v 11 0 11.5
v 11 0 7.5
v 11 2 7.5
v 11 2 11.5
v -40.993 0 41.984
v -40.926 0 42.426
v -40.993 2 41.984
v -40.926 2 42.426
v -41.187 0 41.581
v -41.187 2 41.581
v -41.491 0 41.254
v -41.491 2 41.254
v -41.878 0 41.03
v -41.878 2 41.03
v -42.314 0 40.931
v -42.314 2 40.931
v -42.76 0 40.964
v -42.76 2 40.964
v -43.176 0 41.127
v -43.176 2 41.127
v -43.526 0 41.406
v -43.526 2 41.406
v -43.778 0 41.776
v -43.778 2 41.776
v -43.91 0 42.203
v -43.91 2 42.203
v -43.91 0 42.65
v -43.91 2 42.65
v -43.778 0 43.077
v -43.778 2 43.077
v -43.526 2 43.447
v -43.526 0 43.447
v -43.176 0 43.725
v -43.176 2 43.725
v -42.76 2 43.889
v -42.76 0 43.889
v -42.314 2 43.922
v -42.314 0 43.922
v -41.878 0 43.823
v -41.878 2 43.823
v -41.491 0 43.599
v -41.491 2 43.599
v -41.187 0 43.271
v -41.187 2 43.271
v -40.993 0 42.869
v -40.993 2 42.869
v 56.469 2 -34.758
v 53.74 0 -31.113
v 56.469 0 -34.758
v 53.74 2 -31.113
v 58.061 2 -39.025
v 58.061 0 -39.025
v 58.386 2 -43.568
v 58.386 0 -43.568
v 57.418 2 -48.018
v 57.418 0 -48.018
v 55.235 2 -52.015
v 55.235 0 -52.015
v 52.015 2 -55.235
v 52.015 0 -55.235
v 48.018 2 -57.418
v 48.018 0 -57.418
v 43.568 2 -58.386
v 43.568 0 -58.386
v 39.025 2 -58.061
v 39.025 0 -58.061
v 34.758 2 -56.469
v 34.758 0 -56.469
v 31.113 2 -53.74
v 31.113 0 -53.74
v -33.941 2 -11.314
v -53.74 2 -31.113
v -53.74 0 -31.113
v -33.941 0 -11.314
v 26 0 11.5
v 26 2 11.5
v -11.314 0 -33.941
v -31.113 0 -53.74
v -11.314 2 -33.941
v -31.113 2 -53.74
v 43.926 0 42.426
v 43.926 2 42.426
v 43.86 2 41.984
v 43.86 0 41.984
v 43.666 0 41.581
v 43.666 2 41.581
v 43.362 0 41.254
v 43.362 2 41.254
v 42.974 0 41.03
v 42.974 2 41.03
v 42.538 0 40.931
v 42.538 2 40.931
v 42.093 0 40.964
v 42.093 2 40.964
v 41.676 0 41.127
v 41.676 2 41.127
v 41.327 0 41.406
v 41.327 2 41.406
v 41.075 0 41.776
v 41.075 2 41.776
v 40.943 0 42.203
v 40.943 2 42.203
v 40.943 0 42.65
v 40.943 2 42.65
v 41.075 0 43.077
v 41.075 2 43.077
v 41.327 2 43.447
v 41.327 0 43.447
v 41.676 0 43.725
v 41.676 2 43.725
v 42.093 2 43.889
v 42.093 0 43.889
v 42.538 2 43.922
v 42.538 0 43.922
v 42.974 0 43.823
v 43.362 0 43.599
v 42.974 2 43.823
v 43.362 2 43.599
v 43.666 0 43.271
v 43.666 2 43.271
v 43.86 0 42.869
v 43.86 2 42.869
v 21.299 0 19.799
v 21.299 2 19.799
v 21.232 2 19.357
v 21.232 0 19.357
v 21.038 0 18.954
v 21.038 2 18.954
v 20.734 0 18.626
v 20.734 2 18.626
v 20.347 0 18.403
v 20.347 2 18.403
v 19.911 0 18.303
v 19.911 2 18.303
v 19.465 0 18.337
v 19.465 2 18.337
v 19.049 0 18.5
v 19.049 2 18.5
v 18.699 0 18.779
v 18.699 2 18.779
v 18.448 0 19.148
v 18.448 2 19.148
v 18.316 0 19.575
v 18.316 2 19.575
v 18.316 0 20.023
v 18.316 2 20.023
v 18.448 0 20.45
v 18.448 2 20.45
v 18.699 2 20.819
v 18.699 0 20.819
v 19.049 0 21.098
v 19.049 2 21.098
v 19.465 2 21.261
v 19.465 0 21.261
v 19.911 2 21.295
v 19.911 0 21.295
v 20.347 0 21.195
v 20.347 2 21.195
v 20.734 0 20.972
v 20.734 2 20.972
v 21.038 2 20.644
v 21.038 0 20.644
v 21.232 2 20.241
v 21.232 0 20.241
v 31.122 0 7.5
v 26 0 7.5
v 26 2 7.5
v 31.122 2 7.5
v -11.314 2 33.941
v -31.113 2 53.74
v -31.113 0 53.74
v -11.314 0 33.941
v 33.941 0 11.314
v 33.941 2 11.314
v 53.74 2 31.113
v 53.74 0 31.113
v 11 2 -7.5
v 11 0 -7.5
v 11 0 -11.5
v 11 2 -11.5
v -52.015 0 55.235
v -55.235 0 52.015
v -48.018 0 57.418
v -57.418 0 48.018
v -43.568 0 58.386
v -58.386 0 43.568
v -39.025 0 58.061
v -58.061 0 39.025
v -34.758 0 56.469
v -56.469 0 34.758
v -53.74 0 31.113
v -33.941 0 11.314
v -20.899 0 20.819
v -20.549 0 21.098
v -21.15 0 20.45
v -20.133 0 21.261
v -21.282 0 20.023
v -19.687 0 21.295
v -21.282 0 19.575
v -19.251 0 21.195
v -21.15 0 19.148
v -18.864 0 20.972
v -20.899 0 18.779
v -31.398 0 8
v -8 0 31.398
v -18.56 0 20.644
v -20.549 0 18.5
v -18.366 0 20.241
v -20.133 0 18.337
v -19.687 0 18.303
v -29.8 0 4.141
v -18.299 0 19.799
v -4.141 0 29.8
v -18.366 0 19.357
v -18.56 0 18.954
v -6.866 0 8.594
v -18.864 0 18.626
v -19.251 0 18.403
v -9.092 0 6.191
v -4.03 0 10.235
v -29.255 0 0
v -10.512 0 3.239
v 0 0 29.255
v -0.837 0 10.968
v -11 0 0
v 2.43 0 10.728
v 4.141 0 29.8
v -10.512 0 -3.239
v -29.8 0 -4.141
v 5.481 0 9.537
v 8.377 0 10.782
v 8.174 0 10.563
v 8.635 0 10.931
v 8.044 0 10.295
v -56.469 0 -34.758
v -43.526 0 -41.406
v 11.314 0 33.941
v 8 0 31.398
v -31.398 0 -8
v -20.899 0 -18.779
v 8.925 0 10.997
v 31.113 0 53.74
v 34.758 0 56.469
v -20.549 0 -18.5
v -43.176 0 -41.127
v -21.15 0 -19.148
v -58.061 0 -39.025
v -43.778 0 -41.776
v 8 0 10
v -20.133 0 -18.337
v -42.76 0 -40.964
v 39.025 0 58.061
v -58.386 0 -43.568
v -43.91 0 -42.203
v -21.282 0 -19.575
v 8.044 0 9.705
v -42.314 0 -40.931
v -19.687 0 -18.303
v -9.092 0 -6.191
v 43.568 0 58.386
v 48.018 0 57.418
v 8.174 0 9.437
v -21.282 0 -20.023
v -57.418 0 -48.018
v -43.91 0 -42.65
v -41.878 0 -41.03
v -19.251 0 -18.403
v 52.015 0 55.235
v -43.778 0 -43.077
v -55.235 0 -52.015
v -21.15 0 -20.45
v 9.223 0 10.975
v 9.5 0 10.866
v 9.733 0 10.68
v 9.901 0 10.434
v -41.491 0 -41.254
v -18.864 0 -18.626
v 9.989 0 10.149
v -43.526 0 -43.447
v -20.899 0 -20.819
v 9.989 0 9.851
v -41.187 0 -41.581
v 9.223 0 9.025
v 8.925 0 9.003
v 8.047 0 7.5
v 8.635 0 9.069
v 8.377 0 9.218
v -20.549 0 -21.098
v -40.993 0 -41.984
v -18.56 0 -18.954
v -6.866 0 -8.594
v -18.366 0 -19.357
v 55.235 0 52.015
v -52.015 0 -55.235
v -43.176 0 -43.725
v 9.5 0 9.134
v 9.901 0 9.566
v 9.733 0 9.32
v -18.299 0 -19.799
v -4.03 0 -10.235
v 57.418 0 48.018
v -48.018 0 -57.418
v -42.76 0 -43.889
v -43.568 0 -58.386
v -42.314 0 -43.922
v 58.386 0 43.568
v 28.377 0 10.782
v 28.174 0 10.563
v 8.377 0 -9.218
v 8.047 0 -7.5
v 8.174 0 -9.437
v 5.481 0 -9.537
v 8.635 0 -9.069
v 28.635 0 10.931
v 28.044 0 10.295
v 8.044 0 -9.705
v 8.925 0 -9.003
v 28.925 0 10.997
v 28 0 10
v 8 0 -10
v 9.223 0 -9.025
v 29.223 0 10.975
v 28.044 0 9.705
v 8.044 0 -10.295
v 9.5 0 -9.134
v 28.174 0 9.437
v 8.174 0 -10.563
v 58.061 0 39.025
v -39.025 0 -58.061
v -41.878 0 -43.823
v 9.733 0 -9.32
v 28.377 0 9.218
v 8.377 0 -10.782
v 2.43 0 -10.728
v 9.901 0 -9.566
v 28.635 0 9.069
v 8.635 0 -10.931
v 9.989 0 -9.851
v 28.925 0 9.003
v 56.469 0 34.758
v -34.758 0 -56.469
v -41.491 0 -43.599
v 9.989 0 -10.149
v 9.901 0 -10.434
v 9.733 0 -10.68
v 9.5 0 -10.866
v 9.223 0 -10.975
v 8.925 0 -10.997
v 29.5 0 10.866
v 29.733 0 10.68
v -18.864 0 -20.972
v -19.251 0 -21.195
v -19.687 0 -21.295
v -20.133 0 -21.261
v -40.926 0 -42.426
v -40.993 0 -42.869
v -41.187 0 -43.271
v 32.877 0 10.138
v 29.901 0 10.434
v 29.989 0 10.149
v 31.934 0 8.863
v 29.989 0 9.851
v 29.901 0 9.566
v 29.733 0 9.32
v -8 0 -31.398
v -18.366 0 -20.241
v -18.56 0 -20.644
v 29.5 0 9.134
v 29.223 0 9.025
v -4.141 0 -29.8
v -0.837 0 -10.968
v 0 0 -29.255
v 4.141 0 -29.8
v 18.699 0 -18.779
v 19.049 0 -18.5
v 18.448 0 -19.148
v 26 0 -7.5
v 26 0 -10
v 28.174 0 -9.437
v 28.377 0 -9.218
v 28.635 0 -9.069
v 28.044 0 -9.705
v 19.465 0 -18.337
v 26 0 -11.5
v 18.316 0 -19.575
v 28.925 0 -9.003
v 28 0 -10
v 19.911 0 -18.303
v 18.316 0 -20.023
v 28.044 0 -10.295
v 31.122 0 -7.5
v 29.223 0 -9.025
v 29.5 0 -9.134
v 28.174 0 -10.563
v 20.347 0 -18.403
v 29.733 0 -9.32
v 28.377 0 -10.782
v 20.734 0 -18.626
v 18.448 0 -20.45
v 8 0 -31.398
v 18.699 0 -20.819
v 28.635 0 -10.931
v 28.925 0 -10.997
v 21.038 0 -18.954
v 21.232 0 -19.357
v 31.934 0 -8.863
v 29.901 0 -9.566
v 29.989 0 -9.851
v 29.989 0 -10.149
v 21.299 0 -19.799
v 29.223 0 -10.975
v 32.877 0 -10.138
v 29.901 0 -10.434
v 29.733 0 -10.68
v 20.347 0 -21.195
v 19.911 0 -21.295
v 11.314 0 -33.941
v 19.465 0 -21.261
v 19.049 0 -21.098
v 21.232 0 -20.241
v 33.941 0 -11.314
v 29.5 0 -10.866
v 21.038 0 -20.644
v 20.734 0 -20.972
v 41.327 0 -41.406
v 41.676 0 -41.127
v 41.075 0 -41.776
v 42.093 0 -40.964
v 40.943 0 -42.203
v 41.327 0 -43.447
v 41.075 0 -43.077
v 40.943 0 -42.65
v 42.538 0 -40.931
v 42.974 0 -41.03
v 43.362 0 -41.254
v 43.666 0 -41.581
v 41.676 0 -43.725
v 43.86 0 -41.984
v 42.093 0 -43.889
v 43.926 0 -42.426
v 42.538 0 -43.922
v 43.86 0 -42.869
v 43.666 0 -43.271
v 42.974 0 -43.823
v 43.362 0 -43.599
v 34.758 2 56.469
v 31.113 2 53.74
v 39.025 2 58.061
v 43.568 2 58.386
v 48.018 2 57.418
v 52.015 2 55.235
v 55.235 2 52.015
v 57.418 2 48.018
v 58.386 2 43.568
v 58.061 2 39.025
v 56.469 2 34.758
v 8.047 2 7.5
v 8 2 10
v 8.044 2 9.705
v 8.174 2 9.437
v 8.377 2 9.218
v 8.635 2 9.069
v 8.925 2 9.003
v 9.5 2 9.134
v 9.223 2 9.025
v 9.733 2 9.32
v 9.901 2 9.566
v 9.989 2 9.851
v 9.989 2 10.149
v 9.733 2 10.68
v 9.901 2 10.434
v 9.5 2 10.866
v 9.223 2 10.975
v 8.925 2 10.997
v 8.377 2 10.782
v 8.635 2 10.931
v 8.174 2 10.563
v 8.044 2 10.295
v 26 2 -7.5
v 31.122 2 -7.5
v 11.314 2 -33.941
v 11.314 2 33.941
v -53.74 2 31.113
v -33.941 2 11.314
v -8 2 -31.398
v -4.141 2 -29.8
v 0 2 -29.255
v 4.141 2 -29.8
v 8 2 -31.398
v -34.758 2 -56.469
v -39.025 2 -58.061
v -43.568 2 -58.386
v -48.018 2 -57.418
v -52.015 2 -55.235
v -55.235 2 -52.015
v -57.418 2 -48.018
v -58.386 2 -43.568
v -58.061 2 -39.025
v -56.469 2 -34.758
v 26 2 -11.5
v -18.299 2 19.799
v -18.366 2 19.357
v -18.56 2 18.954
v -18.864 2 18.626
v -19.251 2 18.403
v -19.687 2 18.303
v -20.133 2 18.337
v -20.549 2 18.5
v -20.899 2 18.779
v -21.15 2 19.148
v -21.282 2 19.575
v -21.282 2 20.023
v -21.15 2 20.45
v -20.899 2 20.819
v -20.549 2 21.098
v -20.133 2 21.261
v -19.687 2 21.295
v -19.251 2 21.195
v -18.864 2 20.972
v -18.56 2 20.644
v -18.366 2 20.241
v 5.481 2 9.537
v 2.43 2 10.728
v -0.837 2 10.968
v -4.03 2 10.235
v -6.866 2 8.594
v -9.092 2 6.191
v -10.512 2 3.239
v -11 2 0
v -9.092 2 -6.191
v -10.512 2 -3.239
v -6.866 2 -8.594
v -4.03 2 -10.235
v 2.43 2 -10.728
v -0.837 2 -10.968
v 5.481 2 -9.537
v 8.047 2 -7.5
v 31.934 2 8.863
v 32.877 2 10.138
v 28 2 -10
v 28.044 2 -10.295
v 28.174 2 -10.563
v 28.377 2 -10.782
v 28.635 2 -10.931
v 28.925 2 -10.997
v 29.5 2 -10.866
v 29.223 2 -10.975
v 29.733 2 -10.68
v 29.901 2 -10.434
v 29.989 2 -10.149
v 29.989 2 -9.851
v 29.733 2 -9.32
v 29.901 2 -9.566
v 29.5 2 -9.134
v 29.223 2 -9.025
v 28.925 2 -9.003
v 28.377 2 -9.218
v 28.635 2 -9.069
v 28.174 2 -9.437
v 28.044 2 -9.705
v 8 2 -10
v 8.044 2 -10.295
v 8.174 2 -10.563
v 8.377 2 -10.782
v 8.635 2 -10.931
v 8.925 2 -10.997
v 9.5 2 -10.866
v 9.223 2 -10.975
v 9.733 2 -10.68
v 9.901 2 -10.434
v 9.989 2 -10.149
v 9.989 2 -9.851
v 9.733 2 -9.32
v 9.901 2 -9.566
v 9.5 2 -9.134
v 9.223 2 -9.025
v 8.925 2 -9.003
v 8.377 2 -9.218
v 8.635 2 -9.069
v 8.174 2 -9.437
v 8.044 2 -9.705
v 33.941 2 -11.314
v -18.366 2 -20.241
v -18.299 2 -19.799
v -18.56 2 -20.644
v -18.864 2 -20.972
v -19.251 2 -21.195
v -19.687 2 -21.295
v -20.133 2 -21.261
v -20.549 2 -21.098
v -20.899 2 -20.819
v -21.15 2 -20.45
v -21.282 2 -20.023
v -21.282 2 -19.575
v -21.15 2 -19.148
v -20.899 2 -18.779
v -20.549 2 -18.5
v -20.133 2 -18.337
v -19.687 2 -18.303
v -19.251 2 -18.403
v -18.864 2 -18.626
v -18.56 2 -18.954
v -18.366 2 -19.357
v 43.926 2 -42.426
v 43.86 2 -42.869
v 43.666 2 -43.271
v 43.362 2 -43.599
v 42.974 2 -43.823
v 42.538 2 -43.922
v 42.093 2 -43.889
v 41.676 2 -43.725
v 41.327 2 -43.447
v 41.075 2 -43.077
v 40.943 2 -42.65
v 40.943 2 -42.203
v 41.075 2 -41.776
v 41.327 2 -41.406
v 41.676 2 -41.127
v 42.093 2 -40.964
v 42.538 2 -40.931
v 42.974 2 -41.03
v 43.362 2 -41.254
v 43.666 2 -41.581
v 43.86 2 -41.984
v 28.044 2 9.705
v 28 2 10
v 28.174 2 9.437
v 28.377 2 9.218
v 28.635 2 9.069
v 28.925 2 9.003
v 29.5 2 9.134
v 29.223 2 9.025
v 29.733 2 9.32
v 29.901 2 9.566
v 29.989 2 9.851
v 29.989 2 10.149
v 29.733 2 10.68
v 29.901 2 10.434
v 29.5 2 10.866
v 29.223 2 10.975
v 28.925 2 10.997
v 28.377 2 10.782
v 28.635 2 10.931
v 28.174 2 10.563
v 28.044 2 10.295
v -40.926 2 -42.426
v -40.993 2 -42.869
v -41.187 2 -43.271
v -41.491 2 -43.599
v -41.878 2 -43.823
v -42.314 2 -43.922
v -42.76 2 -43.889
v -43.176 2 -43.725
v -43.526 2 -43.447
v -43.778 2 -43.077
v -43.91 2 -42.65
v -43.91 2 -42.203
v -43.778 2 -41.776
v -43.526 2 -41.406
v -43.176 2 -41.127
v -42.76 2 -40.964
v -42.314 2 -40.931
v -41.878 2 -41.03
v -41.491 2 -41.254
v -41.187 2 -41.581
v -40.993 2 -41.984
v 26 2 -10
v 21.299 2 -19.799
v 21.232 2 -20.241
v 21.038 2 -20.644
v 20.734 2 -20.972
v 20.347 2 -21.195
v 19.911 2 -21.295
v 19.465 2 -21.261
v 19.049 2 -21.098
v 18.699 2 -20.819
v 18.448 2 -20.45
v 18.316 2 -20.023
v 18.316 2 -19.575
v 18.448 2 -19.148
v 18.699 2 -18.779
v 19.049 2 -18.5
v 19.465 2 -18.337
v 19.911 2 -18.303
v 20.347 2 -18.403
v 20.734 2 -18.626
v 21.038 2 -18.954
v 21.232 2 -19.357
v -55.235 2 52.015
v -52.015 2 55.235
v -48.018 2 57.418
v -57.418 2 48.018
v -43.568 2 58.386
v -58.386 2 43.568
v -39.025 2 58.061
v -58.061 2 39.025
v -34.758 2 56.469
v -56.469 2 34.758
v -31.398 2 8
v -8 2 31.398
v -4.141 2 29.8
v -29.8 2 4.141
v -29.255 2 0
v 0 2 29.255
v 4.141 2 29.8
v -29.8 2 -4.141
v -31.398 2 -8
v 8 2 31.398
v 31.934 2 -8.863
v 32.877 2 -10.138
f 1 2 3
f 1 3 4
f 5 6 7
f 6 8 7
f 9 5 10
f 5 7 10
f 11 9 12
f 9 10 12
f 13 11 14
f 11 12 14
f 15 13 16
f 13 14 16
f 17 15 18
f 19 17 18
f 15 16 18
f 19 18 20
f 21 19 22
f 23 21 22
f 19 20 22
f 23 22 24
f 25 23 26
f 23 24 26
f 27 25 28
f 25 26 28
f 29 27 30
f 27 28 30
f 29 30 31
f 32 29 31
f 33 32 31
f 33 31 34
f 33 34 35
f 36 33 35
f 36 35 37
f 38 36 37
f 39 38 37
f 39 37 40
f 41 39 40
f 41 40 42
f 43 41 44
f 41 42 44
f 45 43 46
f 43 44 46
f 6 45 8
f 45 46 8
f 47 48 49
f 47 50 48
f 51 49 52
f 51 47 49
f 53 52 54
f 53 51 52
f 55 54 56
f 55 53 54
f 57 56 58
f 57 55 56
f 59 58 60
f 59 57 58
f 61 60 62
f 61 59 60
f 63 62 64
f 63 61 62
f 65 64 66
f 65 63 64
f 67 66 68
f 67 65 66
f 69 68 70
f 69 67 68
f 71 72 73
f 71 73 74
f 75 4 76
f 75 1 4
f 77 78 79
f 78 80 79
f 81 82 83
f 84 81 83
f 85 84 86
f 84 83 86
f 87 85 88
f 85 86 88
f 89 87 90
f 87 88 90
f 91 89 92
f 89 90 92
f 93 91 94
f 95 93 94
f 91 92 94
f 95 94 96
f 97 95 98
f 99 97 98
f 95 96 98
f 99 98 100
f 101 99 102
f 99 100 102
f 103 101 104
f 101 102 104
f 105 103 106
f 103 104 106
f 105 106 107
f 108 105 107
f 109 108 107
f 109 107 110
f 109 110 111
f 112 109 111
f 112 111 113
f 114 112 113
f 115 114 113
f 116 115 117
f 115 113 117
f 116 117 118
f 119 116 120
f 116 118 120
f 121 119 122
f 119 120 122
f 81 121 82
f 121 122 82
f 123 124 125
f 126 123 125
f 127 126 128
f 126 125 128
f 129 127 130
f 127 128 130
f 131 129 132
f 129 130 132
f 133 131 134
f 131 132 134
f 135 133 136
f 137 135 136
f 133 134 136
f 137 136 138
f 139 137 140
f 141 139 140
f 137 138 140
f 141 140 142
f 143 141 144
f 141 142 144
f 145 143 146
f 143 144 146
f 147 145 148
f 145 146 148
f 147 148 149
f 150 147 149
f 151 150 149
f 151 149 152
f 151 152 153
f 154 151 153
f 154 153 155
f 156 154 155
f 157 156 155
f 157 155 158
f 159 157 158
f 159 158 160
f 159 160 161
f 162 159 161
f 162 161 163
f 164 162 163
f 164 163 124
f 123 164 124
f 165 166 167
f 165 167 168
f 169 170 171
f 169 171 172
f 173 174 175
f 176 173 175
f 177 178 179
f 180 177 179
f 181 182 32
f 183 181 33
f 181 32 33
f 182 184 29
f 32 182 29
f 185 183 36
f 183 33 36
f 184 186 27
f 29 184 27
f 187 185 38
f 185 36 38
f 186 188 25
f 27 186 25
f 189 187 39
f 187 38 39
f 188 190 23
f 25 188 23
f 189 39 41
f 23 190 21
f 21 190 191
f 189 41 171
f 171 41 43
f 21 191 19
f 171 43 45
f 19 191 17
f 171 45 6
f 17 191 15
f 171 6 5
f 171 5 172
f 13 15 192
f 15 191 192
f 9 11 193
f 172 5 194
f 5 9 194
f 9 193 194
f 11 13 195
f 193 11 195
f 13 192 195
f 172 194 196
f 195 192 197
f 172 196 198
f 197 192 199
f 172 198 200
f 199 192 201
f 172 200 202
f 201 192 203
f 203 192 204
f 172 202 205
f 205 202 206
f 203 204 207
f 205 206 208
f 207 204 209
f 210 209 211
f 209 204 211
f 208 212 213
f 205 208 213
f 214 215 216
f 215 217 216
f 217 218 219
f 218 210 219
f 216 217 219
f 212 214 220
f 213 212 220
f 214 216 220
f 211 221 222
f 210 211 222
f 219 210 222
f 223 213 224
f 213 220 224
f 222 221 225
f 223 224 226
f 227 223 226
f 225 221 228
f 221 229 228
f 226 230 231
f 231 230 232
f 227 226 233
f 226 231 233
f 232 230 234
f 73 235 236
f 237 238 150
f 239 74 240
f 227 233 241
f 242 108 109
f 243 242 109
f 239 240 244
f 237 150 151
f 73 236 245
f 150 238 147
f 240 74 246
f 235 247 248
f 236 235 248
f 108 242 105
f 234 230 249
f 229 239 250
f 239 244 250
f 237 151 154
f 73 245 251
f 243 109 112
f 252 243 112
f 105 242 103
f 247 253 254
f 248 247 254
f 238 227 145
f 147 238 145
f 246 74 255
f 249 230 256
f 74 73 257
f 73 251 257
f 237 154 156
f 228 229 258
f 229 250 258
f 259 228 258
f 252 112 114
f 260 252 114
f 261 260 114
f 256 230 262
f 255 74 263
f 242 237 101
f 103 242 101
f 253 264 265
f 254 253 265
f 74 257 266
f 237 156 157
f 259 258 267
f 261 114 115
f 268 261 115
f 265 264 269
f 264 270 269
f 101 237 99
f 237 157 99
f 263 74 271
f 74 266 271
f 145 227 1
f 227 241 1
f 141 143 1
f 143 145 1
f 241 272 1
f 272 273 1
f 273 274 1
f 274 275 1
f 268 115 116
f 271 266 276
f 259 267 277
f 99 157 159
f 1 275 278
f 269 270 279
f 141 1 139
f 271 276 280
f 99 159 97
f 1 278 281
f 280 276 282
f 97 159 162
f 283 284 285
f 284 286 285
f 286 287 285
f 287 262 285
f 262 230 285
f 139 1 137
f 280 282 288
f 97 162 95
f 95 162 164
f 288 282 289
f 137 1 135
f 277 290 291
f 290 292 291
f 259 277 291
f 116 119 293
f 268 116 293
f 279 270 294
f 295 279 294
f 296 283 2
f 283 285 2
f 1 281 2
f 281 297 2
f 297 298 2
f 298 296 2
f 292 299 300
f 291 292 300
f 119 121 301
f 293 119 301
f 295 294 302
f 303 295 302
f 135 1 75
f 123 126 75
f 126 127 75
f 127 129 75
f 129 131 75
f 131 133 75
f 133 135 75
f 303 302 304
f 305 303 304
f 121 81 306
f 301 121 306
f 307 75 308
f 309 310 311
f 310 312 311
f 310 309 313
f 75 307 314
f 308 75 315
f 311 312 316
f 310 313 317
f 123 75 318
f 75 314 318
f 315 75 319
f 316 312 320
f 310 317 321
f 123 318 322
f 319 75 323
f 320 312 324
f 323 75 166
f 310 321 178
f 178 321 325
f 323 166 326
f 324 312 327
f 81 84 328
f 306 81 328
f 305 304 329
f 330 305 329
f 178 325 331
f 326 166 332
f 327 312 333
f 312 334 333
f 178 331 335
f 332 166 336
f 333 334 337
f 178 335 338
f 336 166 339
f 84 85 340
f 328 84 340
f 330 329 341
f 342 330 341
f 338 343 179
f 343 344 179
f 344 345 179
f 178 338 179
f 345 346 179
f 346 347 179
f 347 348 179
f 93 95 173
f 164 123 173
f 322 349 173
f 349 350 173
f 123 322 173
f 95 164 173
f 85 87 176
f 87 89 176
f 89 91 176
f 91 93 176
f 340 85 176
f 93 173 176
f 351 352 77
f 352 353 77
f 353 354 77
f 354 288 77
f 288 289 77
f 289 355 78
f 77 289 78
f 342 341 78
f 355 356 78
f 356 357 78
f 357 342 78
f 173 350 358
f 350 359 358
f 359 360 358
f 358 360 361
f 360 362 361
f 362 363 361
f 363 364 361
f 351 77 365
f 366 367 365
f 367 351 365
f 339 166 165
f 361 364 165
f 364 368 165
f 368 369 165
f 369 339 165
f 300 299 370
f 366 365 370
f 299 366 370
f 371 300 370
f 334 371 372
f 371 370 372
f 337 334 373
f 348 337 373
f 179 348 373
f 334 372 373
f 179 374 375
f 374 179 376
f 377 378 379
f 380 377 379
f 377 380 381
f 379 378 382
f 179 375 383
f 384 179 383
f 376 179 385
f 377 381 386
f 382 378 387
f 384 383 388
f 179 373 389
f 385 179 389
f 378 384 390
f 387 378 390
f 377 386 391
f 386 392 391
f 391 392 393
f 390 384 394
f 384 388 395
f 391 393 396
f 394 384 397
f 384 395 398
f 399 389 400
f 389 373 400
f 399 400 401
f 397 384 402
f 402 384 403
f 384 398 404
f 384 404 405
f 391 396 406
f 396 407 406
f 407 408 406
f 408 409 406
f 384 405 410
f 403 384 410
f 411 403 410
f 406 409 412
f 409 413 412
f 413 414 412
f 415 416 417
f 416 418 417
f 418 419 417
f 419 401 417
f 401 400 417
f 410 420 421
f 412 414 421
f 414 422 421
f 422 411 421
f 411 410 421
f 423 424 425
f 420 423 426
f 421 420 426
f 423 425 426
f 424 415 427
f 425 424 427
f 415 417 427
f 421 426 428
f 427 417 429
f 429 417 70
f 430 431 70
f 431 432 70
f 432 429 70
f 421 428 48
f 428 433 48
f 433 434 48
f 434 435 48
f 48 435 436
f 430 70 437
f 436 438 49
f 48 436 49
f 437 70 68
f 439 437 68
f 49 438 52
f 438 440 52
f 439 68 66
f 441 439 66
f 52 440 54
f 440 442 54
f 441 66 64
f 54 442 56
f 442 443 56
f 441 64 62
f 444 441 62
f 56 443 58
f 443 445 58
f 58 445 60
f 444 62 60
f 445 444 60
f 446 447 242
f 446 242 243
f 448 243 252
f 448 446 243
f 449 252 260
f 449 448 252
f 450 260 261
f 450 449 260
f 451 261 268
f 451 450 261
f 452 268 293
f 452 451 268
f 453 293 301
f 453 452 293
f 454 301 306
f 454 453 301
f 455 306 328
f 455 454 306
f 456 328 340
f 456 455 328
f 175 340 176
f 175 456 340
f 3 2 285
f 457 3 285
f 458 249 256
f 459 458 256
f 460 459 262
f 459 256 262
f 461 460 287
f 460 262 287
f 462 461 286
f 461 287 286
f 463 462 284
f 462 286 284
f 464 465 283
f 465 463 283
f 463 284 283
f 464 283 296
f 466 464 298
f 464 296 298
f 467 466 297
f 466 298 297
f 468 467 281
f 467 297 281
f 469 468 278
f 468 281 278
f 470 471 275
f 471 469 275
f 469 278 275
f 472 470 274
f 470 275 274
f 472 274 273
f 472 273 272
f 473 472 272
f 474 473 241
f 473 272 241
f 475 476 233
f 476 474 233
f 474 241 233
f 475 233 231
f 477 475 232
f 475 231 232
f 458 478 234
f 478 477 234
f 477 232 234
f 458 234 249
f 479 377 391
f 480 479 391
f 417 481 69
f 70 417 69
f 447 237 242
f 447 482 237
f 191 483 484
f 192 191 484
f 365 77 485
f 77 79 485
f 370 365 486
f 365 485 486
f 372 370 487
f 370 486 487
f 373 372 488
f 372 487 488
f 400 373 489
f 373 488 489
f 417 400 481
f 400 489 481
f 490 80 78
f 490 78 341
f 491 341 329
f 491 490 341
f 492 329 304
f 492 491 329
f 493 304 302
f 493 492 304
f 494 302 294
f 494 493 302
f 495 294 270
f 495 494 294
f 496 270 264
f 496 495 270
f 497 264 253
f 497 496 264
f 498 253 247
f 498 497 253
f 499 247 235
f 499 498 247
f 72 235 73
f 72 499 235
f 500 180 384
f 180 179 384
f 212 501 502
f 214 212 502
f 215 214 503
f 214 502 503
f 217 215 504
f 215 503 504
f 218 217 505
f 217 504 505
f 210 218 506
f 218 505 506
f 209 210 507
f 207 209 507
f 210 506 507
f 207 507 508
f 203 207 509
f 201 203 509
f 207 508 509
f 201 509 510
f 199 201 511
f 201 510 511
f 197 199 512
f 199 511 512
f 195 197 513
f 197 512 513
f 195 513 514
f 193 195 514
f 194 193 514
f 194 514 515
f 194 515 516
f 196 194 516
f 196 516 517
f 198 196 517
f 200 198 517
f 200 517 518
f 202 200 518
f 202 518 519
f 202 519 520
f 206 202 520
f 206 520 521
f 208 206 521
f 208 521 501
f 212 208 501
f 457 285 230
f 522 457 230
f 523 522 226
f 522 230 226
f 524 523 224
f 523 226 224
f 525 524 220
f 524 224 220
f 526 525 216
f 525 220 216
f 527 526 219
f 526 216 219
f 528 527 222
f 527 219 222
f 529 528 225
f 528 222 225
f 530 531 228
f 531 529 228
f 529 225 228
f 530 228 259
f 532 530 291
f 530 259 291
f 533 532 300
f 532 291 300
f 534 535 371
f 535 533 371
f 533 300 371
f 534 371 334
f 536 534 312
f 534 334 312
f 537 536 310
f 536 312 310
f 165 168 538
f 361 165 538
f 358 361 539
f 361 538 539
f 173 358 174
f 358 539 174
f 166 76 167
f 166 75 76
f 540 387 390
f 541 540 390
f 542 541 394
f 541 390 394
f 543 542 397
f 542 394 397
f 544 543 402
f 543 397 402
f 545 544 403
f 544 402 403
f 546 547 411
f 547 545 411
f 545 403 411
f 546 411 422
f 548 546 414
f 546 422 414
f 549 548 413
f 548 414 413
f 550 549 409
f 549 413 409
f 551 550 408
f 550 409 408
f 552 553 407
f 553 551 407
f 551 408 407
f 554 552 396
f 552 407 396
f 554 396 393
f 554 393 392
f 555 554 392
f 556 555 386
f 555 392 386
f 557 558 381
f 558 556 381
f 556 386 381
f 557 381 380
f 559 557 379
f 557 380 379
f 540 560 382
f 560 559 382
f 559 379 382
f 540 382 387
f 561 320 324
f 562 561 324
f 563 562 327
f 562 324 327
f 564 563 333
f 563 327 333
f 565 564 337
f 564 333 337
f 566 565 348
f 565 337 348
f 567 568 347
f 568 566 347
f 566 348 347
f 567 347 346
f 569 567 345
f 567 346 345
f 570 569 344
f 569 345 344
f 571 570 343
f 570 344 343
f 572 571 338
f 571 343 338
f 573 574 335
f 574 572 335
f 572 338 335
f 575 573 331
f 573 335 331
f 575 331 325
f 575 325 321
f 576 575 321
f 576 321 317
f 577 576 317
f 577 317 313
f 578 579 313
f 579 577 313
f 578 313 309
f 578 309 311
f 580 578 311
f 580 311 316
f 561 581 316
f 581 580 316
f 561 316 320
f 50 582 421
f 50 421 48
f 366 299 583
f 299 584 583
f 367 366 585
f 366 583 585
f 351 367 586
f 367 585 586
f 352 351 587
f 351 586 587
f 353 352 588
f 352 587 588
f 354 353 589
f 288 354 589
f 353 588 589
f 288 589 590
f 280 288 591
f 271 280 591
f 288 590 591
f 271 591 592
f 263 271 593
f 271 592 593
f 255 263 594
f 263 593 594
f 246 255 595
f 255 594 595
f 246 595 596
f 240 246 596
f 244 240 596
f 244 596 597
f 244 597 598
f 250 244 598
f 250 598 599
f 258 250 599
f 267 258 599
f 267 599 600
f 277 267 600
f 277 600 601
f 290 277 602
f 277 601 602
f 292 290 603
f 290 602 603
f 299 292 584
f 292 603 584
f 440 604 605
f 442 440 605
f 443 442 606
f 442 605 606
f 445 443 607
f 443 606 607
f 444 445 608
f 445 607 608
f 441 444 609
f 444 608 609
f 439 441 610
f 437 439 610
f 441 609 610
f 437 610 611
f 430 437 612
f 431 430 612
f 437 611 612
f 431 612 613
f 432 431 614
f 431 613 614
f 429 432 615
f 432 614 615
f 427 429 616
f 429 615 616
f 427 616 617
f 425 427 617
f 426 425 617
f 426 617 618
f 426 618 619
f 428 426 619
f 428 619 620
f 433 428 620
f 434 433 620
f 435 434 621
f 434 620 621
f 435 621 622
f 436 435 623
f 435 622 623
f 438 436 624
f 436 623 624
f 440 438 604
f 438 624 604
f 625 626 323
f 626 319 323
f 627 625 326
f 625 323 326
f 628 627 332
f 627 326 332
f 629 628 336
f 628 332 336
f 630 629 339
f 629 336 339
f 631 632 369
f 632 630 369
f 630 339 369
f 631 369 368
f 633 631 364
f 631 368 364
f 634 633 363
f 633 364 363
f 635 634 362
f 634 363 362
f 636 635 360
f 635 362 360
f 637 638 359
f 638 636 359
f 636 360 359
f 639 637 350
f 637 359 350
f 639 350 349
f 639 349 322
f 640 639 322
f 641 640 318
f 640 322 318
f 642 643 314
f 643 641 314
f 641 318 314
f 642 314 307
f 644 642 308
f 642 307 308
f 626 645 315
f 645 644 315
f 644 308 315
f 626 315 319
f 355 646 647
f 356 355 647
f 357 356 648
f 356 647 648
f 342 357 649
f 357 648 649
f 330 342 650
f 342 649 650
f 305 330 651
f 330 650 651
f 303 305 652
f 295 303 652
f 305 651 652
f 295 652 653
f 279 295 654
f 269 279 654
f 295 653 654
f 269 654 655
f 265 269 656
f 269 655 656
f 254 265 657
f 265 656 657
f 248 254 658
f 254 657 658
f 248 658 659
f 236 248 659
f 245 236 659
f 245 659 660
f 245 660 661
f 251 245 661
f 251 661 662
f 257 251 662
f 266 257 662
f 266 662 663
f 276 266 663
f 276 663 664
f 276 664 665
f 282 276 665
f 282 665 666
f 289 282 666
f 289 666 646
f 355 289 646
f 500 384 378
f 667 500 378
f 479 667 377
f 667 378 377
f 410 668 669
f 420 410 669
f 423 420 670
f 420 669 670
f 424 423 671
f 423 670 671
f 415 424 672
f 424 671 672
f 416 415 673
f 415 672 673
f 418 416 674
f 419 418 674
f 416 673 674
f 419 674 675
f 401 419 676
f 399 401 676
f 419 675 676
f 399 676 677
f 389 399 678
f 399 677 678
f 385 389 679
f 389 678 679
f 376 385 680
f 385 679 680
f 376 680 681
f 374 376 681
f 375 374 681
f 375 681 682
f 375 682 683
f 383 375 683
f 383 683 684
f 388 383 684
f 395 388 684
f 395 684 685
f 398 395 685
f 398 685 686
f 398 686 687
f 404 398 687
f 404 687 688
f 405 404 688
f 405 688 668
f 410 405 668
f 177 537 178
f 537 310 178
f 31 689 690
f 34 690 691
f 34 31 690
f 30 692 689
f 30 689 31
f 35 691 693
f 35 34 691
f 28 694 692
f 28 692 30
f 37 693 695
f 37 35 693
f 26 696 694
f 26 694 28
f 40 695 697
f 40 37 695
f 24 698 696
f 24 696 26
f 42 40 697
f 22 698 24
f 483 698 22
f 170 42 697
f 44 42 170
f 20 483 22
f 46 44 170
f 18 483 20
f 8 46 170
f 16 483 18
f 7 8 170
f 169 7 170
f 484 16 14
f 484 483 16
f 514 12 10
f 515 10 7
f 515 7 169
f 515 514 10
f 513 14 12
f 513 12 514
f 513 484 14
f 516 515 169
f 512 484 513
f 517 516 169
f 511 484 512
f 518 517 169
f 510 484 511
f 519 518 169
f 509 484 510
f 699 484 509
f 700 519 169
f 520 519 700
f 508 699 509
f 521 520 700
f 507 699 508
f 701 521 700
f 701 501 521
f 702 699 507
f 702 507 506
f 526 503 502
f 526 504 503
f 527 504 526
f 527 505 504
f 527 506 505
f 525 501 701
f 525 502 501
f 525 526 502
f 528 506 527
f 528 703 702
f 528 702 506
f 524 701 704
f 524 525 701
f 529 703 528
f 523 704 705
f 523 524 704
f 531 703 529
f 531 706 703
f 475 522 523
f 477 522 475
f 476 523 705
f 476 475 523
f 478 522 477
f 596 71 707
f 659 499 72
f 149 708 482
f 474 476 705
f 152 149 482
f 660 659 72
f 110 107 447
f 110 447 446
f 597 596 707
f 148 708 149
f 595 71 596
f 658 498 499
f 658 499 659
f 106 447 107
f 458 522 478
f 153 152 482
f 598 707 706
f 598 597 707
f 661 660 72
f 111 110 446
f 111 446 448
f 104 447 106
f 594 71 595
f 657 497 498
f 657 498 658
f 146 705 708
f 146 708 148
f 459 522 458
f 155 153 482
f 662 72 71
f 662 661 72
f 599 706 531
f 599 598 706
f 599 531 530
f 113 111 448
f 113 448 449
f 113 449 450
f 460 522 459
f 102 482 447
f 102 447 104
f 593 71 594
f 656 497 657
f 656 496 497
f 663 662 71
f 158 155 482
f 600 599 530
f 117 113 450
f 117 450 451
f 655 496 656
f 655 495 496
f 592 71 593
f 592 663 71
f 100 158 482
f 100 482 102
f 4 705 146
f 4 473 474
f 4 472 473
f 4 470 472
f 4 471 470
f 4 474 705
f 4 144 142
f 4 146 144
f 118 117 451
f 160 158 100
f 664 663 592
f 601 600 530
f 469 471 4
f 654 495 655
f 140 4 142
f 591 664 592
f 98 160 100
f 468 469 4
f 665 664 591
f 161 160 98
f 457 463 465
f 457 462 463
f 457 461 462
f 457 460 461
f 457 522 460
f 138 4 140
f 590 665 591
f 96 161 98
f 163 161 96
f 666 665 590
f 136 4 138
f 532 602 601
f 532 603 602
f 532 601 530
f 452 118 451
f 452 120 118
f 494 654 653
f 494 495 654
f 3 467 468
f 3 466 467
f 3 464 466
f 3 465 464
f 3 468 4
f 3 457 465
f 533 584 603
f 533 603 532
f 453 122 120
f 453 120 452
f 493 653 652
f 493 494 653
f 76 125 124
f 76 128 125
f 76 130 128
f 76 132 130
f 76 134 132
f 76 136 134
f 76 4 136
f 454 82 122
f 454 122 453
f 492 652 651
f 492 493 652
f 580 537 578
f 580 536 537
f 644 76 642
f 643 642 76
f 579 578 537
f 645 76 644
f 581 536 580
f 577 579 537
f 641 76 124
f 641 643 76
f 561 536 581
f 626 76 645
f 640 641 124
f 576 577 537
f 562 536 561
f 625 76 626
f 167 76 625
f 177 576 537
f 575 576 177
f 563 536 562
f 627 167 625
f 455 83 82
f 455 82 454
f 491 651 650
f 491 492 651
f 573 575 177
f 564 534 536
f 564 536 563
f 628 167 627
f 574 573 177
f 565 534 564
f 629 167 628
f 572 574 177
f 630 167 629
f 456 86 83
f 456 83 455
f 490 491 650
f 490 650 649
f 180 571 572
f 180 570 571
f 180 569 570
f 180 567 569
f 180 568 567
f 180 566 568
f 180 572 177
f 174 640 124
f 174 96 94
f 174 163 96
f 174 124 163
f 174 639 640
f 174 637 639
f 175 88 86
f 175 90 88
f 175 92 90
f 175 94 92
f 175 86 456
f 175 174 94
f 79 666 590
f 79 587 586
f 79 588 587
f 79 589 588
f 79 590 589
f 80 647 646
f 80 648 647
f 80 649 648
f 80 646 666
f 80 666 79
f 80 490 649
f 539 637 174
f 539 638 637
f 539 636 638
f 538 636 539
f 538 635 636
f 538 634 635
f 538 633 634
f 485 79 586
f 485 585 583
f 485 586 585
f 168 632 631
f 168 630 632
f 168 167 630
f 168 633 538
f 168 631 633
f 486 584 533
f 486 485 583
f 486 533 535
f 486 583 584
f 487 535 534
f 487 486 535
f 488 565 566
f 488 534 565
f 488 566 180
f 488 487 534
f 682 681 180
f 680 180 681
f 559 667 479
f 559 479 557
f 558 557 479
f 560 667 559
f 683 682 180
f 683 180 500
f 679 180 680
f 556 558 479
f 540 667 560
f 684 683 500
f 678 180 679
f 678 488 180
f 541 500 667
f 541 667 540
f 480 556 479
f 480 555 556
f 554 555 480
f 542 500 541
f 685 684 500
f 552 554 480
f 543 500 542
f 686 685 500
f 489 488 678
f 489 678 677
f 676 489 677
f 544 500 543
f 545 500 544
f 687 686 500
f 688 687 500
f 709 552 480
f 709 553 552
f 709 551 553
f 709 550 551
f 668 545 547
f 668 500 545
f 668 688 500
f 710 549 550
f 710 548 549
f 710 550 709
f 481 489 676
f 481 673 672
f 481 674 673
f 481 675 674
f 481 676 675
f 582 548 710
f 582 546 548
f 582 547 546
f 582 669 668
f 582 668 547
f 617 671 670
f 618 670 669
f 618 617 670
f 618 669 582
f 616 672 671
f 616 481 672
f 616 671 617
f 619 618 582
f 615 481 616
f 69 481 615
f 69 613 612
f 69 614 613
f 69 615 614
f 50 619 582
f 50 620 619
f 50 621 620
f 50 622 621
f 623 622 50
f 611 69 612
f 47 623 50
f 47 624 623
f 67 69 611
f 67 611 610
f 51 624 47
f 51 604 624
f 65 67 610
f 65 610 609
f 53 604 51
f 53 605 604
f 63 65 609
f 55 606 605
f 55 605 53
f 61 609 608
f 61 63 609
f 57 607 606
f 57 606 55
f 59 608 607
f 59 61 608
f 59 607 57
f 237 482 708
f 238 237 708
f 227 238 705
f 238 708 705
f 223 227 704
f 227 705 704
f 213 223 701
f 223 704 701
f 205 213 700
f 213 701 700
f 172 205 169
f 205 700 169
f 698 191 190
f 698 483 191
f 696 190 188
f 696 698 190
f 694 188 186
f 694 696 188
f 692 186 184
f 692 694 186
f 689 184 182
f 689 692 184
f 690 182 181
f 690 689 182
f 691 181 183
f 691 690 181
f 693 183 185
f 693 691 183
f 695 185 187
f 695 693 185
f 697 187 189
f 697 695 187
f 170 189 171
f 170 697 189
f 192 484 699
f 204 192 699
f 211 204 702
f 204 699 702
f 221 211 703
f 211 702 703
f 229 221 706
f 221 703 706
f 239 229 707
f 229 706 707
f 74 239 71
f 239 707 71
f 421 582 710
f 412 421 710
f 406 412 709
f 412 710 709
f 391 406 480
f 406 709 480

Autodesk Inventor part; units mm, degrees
ref_plane "YZ Plane" through (0, 0, 0) normal (1, 0, 0) x (0, 1, 0)
ref_plane "XZ Plane" through (0, 0, 0) normal (0, 1, 0) x (-1, 0, 0)
ref_plane "XY Plane" through (0, 0, 0) normal (0, 0, 1) x (1, 0, 0)
sketch "Sketch1" plane through (0, 0, 0) normal (0, 1, 0) x (-1, 0, 0)
  circle A0 centre (0, 0) radius 120
  circle A1 centre (-9, 10) radius 1
  circle A2 centre (-9, -10) radius 1
  circle A3 centre (-29, -10) radius 1
  circle A4 centre (-29, 10) radius 1
  arc A5 (-8.0467, -7.5) -> (-8.0467, 7.5) centre (0, 0) ccw
  line L0 (-9, -7.5) -> (-8.0467, -7.5)
  line L1 (-9, -7.5) -> (-11, -7.5)
  line L2 (-11, -7.5) -> (-11, -11.5)
  line L3 (-29, -10) -> (-26, -10)
  line L4 (-11, -11.5) -> (-26, -11.5)
  line L5 (-26, -11.5) -> (-26, -7.5)
  line L6 (-26, -7.5) -> (-35, -7.5)
  line L7 (-35, -7.5) -> (-35, 0)
  line L8 (-9, 7.5) -> (-8.0467, 7.5)
  line L9 (-9, 7.5) -> (-11, 7.5)
  line L10 (-11, 7.5) -> (-11, 11.5)
  line L11 (-11, 11.5) -> (-26, 11.5)
  line L12 (-26, 11.5) -> (-26, 7.5)
  line L13 (-26, 7.5) -> (-35, 7.5)
  line L14 (-35, 7.5) -> (-35, 0)
  dimension "d0" = 240
  dimension "d5" = 2
  dimension "d6" = 2
  dimension "d7" = 2
  dimension "d8" = 2
  dimension "d9" = 22
  dimension "d12" = 2
  dimension "d13" = 3
  dimension "d14" = 4
  dimension "d15" = 9
extrude "Extrusion1" add sketch "Sketch1" along normal blind 2
sketch "Sketch4" plane through (0, 2, 0) normal (0, 1, 0) x (1, 0, 0)
  circle A0 centre (0, 0) radius 60
  circle A1 centre (0, 0) radius 120.1645
  dimension "d28" = 120
  dimension "d29" = 240.329
extrude "Extrusion3" cut sketch "Sketch4" against normal blind 12
sketch "Sketch5" plane through (0, 2, 0) normal (0, 1, 0) x (1, 0, 0)
  circle A0 centre (0, 0) radius 28
  line L0 (0, 0) -> (19.799, 19.799)
  line L1 (0, 0) -> (28, 0) construction
  line L2 (19.799, 19.799) -> (-19.799, 19.799)
  line L3 (-19.799, 19.799) -> (-19.799, -19.799)
  line L4 (-19.799, -19.799) -> (19.799, -19.799)
  circle A1 centre (-19.799, -19.799) radius 3
  circle A2 centre (-19.799, 19.799) radius 3
  circle A3 centre (19.799, 19.799) radius 3
  circle A4 centre (19.799, -19.799) radius 3
  line L5 (19.799, 19.799) -> (42.4264, 42.4264)
  circle A5 centre (0, 0) radius 80
  circle A6 centre (0, 0) radius 60
  dimension "d56" = 56
  dimension "d57" = 45
  dimension "d58" = 6
  dimension "d59" = 6
  dimension "d60" = 6
  dimension "d62" = 6
  dimension "d63" = 32
  dimension "d64" = 160
extrude "Extrusion4" add sketch "Sketch5" against normal blind 2 contours A5
sketch "Sketch8" plane through (0, 2, 0) normal (0, 1, 0) x (1, 0, 0)
  circle A0 centre (-42.4264, -42.4264) radius 3 projected
  arc A1 (-53.7401, -31.1127) -> (-31.1127, -53.7401) centre (-42.4264, -42.4264) ccw
  circle A2 centre (42.4264, -42.4264) radius 3 projected
  arc A3 (31.1127, -53.7401) -> (53.7401, -31.1127) centre (42.4264, -42.4264) ccw
  circle A4 centre (42.4264, 42.4264) radius 3 projected
  arc A5 (53.7401, 31.1127) -> (31.1127, 53.7401) centre (42.4264, 42.4264) ccw
  circle A6 centre (-42.4264, 42.4264) radius 3 projected
  arc A7 (-31.1127, 53.7401) -> (-53.7401, 31.1127) centre (-42.4264, 42.4264) ccw
  line L0 (-53.7401, 31.1127) -> (-33.9411, 11.3137)
  line L1 (11.3137, -33.9411) -> (31.1127, -53.7401)
  line L2 (-53.7401, -31.1127) -> (-33.9411, -11.3137)
  line L3 (11.3137, 33.9411) -> (31.1127, 53.7401)
  line L4 (-31.1127, 53.7401) -> (-11.3137, 33.9411)
  line L5 (33.9411, -11.3137) -> (53.7401, -31.1127)
  line L6 (-31.1127, -53.7401) -> (-11.3137, -33.9411)
  line L7 (33.9411, 11.3137) -> (53.7401, 31.1127)
  arc A8 (11.3137, -33.9411) -> (-11.3137, -33.9411) centre (0, -45.2548) ccw
  arc A9 (33.9411, 11.3137) -> (33.9411, -11.3137) centre (45.2548, 0) ccw
  arc A10 (-11.3137, 33.9411) -> (11.3137, 33.9411) centre (0, 45.2548) ccw
  arc A11 (-33.9411, -11.3137) -> (-33.9411, 11.3137) centre (-45.2548, 0) ccw
  circle A12 centre (0, 0) radius 80
extrude "Extrusion7" cut sketch "Sketch8" against normal blind 2 contours A12
sketch "Sketch10" plane through (0, 2, 0) normal (0, 1, 0) x (1, 0, 0)
  line L0 (0, 0) -> (60, 0) construction
  circle A0 centre (42.4264, -42.4264) radius 1.5
  circle A1 centre (19.799, -19.799) radius 1.5
  circle A2 centre (19.799, 19.799) radius 1.5
  circle A3 centre (42.4264, 42.4264) radius 1.5
  circle A4 centre (-19.799, 19.799) radius 1.5
  circle A5 centre (-42.4264, 42.4264) radius 1.5
  circle A6 centre (-19.799, -19.799) radius 1.5
  circle A7 centre (-42.4264, -42.4264) radius 1.5
  dimension "d128" = 3
  dimension "d129" = 3
  dimension "d132" = 360
extrude "Extrusion9" cut sketch "Sketch10" against normal blind 10
properties part number "platform 1"
